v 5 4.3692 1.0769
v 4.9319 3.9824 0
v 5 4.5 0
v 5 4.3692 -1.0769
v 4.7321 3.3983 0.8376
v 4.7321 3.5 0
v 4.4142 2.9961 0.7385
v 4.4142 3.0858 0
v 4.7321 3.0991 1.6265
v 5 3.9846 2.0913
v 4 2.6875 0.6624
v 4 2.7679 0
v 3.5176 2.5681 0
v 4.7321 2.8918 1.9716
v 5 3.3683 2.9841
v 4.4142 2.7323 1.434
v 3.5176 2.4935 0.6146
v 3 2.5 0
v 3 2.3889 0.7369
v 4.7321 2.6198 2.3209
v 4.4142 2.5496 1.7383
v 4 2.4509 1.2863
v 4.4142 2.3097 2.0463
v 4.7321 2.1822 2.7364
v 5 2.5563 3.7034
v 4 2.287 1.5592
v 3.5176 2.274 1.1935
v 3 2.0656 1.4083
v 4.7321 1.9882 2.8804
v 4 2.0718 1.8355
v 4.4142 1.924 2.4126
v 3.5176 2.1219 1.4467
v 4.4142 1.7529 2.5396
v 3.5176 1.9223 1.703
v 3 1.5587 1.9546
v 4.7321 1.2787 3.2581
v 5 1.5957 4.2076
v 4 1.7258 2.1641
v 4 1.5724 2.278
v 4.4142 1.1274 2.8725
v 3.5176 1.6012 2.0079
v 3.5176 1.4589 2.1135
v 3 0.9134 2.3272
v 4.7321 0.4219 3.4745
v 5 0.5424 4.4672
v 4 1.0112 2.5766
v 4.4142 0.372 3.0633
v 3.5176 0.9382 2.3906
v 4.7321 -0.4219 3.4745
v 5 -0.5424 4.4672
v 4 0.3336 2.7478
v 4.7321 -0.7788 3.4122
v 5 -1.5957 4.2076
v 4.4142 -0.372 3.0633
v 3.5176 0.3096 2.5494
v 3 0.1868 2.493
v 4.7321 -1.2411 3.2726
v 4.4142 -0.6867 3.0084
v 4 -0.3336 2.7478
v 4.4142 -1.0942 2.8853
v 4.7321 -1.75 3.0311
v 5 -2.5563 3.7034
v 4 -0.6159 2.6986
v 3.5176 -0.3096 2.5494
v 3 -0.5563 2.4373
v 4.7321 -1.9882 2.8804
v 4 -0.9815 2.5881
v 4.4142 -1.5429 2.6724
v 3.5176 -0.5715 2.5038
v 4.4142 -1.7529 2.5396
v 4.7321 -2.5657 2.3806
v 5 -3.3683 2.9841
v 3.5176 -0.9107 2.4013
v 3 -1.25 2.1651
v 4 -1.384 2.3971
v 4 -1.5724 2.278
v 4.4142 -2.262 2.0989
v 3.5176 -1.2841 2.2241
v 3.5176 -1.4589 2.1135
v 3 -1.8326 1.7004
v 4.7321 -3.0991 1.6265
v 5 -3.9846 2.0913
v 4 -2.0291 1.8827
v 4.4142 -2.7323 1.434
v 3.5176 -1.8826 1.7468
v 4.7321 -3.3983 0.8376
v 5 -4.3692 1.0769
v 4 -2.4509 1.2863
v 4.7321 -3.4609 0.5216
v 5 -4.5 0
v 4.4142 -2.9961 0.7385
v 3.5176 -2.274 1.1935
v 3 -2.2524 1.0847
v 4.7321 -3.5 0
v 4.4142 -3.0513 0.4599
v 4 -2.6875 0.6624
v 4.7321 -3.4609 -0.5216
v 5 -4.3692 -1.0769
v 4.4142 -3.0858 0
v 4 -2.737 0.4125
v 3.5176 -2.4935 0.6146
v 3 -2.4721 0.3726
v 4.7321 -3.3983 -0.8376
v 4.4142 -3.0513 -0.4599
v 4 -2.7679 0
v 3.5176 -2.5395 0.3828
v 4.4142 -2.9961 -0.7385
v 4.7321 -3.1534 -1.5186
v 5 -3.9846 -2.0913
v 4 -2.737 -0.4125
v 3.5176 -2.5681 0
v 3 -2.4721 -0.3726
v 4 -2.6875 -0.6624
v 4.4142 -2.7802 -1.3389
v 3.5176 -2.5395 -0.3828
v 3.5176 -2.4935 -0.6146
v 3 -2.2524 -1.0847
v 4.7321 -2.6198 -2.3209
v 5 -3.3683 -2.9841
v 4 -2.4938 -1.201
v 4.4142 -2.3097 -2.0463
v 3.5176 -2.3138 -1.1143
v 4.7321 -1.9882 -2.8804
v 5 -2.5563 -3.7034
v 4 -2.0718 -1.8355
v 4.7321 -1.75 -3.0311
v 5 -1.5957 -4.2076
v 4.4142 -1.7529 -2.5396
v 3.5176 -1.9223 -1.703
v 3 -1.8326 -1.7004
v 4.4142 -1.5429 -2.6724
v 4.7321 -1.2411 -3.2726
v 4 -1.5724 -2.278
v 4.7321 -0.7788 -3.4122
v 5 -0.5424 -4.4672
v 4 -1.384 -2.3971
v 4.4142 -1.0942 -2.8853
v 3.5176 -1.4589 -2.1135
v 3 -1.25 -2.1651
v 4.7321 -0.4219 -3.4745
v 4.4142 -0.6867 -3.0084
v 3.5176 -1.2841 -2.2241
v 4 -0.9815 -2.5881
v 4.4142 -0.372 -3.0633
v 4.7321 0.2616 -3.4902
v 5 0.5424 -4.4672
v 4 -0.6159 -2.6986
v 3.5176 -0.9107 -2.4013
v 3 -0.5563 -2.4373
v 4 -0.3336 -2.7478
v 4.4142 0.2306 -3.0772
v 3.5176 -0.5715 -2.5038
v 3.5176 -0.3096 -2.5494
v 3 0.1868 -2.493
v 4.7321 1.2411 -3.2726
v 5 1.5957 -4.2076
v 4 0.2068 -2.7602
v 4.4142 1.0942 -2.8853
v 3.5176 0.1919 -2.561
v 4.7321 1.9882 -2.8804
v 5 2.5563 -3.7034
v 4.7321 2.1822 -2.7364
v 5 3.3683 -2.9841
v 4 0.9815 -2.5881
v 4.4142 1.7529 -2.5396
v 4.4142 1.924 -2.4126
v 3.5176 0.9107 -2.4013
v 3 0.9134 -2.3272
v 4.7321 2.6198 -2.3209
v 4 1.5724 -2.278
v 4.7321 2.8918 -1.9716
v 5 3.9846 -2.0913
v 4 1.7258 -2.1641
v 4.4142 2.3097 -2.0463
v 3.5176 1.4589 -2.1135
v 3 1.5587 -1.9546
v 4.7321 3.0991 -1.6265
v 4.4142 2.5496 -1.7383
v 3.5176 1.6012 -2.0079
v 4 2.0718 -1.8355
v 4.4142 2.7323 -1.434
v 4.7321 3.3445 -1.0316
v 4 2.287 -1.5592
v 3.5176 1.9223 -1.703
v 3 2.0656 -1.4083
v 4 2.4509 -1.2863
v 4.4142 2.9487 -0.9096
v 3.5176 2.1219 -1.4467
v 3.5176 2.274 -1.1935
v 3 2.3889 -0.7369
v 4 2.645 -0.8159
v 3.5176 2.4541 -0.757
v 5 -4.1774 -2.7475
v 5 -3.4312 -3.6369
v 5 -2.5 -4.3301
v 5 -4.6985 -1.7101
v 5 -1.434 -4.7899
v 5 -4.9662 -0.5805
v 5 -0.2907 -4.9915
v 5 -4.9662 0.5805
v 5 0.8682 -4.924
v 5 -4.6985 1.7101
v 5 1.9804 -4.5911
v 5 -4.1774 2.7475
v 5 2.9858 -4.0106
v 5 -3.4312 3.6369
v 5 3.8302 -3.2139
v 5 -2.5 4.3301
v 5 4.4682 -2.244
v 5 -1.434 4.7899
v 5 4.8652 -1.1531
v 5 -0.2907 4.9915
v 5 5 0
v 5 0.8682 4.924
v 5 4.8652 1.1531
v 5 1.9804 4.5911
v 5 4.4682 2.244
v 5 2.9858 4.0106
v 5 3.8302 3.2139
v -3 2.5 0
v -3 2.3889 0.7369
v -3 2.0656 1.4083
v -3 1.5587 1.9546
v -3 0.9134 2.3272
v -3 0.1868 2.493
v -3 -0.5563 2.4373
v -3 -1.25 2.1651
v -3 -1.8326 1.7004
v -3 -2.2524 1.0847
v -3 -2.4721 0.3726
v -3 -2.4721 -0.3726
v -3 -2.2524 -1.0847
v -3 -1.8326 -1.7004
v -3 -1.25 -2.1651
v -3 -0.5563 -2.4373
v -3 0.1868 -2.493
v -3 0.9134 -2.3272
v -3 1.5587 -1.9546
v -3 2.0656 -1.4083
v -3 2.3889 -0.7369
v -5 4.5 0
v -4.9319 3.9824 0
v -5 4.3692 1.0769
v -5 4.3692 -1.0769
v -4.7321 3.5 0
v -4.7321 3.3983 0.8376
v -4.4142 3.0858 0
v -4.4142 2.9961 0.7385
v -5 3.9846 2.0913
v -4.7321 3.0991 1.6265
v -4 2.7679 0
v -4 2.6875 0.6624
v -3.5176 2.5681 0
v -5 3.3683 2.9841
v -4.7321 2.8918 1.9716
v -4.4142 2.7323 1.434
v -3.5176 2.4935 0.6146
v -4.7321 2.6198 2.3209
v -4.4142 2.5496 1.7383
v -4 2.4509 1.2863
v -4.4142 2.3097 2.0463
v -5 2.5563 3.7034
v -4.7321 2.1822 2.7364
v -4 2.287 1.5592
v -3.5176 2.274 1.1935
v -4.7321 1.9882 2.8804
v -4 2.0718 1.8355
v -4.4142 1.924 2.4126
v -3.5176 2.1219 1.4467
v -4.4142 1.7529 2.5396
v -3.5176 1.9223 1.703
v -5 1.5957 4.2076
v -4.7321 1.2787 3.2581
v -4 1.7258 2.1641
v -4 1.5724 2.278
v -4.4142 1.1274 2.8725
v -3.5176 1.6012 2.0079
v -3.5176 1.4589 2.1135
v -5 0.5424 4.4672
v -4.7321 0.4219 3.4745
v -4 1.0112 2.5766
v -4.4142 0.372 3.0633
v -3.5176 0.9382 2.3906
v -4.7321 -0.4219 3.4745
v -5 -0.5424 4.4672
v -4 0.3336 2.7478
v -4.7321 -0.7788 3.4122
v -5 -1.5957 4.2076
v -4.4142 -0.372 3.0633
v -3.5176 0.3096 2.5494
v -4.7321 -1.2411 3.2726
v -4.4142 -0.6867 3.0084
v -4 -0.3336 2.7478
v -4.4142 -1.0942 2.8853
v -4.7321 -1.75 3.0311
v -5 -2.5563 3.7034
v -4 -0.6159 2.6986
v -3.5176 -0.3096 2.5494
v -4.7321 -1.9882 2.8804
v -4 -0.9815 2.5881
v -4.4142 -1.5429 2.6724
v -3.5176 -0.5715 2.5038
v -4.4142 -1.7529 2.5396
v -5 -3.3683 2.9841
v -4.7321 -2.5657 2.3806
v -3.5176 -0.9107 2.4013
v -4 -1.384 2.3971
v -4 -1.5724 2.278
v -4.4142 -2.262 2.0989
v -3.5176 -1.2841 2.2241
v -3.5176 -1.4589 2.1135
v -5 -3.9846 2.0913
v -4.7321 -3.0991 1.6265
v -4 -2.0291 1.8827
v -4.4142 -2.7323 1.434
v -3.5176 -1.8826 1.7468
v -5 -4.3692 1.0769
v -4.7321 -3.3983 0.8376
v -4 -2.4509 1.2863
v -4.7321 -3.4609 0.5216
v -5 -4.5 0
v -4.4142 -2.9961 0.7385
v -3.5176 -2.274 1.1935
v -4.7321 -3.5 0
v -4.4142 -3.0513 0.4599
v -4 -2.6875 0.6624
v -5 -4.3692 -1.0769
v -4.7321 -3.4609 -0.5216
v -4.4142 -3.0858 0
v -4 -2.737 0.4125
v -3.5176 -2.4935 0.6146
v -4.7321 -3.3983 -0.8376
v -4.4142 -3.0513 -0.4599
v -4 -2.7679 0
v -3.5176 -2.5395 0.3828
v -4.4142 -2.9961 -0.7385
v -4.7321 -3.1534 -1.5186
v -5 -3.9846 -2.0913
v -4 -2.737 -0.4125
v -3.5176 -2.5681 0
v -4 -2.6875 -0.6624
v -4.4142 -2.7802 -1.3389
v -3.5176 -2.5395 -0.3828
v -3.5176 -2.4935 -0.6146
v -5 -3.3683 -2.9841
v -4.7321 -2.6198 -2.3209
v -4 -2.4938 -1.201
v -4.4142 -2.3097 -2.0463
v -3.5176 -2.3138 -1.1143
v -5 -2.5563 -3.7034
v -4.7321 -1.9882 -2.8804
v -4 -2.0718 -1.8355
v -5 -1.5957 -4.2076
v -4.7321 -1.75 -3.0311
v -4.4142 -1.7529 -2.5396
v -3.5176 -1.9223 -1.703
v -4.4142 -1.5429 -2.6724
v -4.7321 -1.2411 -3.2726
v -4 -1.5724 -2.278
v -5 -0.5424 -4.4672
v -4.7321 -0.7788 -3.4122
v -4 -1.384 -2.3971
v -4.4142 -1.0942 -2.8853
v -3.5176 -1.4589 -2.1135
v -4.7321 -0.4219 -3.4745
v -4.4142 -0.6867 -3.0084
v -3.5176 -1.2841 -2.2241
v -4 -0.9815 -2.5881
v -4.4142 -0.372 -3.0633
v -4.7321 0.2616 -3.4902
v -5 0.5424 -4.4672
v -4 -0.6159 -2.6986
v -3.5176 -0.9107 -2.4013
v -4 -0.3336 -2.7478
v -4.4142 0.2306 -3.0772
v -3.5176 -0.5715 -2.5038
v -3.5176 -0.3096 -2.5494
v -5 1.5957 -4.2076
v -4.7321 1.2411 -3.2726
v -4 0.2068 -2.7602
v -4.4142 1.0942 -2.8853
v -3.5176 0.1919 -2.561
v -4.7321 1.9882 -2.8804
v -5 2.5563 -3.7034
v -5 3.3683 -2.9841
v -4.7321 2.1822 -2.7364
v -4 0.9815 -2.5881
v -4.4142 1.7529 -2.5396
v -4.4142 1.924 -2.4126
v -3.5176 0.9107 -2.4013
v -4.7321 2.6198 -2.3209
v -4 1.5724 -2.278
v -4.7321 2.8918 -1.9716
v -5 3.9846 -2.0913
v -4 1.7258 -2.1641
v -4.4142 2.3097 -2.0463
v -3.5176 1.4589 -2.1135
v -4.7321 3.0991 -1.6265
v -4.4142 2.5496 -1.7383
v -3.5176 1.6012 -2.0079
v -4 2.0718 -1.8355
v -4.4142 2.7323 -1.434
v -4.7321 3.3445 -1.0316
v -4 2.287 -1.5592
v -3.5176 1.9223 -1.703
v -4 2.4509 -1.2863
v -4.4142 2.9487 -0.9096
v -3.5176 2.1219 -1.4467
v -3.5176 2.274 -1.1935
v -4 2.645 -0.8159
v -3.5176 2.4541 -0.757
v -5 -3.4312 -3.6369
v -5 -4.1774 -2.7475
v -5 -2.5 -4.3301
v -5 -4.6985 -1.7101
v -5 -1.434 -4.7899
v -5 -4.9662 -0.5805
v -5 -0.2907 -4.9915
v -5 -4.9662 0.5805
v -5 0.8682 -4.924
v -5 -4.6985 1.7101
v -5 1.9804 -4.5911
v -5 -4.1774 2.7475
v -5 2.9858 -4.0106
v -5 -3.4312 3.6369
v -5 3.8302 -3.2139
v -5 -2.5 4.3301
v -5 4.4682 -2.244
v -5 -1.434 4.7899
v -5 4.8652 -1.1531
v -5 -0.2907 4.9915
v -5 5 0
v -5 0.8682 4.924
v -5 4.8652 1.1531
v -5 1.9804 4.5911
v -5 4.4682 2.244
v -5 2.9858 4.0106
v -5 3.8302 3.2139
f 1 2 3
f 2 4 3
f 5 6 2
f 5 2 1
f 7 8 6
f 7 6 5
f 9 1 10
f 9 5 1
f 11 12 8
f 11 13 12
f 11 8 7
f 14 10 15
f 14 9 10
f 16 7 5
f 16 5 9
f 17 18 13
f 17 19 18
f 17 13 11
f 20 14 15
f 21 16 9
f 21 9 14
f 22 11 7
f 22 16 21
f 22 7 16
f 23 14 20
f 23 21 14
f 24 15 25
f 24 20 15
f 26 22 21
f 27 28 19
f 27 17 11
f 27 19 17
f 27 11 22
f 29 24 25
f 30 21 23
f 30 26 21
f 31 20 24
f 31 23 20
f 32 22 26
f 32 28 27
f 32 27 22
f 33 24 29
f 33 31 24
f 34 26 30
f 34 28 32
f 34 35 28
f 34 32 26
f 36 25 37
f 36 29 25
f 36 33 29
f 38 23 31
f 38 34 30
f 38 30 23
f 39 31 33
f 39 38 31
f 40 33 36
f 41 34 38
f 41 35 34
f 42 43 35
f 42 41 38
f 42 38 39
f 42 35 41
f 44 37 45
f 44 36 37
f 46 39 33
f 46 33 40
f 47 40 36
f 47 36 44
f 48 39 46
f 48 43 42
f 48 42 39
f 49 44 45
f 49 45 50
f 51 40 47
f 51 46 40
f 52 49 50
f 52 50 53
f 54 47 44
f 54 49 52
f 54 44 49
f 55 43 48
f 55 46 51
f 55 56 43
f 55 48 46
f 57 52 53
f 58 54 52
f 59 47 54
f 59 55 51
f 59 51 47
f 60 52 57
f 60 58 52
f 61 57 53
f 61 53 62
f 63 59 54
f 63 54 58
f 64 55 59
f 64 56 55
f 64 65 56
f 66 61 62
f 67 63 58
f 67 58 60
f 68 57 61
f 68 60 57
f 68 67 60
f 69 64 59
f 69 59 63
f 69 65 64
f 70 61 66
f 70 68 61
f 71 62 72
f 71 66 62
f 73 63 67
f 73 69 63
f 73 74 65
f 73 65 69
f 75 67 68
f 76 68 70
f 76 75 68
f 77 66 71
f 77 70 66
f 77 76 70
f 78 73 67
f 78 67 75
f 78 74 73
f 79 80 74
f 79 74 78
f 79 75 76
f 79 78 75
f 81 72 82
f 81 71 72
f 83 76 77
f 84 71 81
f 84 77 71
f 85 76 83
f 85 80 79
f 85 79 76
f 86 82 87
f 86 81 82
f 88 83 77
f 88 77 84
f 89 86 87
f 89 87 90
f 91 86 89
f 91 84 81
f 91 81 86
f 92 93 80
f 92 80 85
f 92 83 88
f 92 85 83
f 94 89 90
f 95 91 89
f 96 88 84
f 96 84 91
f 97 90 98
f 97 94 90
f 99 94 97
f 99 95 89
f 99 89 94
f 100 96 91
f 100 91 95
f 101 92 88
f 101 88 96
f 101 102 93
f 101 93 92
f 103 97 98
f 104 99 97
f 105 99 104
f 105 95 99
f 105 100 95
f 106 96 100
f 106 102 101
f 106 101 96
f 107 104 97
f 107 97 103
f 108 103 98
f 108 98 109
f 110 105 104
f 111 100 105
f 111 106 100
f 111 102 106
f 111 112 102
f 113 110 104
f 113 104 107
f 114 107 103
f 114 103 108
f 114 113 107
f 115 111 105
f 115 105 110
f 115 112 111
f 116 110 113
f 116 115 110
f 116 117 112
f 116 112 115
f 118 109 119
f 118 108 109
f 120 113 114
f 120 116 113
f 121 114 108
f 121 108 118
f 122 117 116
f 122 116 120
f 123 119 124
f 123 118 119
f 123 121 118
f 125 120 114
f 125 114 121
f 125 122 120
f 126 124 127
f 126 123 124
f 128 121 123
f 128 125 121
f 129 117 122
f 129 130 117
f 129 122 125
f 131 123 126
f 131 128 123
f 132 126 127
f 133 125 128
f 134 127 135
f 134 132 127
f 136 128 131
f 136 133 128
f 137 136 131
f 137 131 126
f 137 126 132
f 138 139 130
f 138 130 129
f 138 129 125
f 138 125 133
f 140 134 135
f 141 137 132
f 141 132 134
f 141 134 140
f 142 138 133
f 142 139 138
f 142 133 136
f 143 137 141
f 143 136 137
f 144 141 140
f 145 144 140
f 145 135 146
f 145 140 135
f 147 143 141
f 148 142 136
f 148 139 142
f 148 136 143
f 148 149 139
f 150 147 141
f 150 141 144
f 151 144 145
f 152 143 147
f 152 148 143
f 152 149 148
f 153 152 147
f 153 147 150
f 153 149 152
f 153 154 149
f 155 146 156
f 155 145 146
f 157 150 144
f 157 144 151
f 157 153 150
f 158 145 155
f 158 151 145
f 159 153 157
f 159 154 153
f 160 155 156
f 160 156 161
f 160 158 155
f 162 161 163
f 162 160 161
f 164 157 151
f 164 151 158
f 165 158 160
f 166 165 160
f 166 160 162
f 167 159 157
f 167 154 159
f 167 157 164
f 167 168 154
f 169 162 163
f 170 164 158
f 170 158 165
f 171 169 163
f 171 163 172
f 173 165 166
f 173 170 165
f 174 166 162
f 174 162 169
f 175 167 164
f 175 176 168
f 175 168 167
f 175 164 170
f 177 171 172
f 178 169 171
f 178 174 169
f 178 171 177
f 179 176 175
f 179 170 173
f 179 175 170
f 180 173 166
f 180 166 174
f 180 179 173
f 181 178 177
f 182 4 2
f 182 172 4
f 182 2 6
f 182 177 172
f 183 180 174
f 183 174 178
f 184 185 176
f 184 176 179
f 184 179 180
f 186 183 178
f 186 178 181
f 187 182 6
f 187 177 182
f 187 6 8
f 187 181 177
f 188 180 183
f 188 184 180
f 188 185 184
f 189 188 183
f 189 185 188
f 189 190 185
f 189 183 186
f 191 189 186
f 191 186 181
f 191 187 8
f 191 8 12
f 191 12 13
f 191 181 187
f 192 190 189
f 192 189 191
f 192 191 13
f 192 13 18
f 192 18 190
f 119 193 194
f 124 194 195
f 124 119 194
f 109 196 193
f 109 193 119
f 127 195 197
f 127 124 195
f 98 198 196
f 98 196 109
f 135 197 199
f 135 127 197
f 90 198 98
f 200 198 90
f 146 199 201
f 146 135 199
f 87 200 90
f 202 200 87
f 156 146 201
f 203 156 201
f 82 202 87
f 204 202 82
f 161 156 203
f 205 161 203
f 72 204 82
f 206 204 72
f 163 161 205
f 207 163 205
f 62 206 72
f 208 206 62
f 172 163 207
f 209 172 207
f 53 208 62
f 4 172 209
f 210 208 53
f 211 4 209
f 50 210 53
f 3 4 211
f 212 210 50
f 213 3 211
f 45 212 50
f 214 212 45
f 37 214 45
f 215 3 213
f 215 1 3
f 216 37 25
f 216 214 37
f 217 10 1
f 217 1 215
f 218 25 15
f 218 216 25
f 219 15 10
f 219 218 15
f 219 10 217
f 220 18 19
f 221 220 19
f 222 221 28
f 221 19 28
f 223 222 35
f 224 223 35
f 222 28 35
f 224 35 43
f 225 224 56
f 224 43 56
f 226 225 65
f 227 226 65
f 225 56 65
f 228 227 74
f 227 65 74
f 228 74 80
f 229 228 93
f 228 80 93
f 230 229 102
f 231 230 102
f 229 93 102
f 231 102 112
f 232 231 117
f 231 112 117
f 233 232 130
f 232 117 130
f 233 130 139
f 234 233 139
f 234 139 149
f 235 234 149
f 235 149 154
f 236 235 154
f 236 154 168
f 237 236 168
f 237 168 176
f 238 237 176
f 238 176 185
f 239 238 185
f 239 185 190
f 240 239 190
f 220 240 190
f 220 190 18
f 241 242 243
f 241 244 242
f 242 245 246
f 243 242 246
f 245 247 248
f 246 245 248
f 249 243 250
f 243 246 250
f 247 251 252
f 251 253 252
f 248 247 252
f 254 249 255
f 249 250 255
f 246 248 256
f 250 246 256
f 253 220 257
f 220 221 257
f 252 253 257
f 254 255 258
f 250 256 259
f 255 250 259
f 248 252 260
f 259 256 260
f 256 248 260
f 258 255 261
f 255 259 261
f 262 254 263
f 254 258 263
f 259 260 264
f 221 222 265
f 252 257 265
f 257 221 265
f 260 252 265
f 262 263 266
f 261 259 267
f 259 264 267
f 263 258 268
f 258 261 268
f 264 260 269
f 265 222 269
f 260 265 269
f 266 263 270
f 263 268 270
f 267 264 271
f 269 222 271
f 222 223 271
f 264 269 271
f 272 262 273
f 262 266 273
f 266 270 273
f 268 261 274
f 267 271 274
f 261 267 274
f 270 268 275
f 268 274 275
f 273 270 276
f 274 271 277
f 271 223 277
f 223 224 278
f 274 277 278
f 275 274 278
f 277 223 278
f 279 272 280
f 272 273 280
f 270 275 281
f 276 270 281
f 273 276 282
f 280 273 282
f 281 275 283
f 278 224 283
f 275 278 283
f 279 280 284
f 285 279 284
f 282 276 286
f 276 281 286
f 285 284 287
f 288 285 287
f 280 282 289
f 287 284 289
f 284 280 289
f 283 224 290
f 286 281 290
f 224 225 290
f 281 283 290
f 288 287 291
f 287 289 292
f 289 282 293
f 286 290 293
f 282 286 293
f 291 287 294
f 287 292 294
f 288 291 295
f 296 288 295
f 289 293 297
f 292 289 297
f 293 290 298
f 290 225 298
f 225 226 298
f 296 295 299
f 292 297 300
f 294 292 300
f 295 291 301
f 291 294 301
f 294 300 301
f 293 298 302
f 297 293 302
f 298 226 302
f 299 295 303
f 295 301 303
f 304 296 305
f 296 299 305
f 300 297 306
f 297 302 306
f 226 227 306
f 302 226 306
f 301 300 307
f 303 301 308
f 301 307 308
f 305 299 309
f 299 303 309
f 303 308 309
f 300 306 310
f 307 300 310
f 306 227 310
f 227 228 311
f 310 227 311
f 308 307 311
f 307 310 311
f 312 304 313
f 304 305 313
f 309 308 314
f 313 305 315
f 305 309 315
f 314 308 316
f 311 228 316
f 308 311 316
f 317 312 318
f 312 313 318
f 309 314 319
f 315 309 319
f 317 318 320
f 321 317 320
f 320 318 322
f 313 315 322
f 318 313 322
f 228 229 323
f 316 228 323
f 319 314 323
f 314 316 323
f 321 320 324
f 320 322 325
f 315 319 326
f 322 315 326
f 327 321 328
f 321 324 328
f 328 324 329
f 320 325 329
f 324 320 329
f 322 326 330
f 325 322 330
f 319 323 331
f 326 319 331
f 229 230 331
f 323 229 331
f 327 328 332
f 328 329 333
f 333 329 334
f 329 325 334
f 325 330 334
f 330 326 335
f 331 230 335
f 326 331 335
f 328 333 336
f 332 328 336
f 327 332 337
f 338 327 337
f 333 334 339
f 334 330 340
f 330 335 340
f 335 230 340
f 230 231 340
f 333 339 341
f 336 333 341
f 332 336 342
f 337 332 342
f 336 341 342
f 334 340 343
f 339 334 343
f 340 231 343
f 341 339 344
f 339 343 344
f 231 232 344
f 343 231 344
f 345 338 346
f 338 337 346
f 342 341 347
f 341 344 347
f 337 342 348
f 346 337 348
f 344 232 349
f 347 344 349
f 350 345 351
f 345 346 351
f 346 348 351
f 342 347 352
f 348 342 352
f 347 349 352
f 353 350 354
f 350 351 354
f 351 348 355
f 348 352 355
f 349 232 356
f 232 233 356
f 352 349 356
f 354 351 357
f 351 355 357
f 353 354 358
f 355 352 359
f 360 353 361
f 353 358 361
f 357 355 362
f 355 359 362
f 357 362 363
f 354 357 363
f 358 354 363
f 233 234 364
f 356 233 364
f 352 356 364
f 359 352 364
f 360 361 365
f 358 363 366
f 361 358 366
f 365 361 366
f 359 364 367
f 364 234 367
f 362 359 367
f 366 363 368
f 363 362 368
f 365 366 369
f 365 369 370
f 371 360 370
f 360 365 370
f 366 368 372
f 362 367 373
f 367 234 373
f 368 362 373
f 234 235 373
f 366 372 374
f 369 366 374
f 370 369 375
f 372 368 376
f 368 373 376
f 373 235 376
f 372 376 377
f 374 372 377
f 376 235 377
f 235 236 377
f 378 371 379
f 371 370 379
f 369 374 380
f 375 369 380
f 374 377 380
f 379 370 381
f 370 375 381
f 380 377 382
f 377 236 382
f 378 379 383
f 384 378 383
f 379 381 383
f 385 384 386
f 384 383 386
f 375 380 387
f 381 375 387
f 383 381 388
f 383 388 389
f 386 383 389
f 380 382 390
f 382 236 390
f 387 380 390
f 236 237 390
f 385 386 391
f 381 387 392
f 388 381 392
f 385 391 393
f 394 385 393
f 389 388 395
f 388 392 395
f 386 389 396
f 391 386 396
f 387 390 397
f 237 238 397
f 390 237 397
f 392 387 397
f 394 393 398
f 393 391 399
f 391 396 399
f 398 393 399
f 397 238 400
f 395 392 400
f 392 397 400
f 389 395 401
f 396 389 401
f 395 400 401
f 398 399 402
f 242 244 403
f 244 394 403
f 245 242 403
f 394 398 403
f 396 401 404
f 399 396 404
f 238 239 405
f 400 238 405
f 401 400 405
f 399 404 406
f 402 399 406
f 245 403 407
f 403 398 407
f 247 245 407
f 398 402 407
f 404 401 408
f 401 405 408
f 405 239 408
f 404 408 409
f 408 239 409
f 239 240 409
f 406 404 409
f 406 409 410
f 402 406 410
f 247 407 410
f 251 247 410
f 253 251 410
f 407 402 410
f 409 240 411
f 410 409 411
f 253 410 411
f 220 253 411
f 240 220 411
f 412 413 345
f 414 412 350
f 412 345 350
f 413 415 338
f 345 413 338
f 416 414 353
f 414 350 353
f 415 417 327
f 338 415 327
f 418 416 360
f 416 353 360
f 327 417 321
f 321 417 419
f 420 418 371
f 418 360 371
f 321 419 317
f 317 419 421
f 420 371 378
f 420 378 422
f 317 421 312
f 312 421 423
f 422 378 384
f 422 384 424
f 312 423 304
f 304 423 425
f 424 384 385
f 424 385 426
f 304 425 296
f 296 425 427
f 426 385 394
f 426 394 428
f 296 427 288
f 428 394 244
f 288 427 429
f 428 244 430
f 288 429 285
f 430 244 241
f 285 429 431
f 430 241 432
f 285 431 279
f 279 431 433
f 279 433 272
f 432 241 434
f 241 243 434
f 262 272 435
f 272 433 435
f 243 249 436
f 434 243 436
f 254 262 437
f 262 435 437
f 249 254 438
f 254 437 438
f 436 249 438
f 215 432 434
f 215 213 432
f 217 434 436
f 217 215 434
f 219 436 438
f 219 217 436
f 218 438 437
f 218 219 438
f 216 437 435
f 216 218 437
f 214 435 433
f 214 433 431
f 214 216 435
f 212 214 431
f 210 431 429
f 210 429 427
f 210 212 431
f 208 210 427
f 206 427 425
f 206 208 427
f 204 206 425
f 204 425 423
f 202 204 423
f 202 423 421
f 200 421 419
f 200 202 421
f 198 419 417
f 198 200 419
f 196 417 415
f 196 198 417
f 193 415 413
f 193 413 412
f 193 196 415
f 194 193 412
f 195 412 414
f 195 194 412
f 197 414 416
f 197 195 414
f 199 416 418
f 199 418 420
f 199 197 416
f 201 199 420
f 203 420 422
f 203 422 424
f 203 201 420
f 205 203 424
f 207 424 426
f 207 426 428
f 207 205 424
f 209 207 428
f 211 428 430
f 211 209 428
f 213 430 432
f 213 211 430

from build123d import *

# Parameters (mm, degrees)
F0_R     = 5
F1_DEPTH = 5
F2_R     = 2.5
F3_DEPTH = 25
F4_R     = 2


with BuildPart() as f1:
    # F0 (on Right) → F1 (new body, symmetric)
    with BuildSketch(Plane.YZ):
        Circle(F0_R)
    extrude(amount=F1_DEPTH, both=True)

    # F2 (on face) → F3 (cut)
    with BuildSketch(Plane.YZ.offset(5)):
        Circle(F2_R)
    extrude(amount=-F3_DEPTH, mode=Mode.SUBTRACT)

    # F4
    f4_edges = [f1.edges().sort_by_distance(p)[0] for p in [
        (5, -2.5, 0),
        (-5, -2.5, 0),
    ]]
    fillet(f4_edges, radius=F4_R)


solid = f1.part
